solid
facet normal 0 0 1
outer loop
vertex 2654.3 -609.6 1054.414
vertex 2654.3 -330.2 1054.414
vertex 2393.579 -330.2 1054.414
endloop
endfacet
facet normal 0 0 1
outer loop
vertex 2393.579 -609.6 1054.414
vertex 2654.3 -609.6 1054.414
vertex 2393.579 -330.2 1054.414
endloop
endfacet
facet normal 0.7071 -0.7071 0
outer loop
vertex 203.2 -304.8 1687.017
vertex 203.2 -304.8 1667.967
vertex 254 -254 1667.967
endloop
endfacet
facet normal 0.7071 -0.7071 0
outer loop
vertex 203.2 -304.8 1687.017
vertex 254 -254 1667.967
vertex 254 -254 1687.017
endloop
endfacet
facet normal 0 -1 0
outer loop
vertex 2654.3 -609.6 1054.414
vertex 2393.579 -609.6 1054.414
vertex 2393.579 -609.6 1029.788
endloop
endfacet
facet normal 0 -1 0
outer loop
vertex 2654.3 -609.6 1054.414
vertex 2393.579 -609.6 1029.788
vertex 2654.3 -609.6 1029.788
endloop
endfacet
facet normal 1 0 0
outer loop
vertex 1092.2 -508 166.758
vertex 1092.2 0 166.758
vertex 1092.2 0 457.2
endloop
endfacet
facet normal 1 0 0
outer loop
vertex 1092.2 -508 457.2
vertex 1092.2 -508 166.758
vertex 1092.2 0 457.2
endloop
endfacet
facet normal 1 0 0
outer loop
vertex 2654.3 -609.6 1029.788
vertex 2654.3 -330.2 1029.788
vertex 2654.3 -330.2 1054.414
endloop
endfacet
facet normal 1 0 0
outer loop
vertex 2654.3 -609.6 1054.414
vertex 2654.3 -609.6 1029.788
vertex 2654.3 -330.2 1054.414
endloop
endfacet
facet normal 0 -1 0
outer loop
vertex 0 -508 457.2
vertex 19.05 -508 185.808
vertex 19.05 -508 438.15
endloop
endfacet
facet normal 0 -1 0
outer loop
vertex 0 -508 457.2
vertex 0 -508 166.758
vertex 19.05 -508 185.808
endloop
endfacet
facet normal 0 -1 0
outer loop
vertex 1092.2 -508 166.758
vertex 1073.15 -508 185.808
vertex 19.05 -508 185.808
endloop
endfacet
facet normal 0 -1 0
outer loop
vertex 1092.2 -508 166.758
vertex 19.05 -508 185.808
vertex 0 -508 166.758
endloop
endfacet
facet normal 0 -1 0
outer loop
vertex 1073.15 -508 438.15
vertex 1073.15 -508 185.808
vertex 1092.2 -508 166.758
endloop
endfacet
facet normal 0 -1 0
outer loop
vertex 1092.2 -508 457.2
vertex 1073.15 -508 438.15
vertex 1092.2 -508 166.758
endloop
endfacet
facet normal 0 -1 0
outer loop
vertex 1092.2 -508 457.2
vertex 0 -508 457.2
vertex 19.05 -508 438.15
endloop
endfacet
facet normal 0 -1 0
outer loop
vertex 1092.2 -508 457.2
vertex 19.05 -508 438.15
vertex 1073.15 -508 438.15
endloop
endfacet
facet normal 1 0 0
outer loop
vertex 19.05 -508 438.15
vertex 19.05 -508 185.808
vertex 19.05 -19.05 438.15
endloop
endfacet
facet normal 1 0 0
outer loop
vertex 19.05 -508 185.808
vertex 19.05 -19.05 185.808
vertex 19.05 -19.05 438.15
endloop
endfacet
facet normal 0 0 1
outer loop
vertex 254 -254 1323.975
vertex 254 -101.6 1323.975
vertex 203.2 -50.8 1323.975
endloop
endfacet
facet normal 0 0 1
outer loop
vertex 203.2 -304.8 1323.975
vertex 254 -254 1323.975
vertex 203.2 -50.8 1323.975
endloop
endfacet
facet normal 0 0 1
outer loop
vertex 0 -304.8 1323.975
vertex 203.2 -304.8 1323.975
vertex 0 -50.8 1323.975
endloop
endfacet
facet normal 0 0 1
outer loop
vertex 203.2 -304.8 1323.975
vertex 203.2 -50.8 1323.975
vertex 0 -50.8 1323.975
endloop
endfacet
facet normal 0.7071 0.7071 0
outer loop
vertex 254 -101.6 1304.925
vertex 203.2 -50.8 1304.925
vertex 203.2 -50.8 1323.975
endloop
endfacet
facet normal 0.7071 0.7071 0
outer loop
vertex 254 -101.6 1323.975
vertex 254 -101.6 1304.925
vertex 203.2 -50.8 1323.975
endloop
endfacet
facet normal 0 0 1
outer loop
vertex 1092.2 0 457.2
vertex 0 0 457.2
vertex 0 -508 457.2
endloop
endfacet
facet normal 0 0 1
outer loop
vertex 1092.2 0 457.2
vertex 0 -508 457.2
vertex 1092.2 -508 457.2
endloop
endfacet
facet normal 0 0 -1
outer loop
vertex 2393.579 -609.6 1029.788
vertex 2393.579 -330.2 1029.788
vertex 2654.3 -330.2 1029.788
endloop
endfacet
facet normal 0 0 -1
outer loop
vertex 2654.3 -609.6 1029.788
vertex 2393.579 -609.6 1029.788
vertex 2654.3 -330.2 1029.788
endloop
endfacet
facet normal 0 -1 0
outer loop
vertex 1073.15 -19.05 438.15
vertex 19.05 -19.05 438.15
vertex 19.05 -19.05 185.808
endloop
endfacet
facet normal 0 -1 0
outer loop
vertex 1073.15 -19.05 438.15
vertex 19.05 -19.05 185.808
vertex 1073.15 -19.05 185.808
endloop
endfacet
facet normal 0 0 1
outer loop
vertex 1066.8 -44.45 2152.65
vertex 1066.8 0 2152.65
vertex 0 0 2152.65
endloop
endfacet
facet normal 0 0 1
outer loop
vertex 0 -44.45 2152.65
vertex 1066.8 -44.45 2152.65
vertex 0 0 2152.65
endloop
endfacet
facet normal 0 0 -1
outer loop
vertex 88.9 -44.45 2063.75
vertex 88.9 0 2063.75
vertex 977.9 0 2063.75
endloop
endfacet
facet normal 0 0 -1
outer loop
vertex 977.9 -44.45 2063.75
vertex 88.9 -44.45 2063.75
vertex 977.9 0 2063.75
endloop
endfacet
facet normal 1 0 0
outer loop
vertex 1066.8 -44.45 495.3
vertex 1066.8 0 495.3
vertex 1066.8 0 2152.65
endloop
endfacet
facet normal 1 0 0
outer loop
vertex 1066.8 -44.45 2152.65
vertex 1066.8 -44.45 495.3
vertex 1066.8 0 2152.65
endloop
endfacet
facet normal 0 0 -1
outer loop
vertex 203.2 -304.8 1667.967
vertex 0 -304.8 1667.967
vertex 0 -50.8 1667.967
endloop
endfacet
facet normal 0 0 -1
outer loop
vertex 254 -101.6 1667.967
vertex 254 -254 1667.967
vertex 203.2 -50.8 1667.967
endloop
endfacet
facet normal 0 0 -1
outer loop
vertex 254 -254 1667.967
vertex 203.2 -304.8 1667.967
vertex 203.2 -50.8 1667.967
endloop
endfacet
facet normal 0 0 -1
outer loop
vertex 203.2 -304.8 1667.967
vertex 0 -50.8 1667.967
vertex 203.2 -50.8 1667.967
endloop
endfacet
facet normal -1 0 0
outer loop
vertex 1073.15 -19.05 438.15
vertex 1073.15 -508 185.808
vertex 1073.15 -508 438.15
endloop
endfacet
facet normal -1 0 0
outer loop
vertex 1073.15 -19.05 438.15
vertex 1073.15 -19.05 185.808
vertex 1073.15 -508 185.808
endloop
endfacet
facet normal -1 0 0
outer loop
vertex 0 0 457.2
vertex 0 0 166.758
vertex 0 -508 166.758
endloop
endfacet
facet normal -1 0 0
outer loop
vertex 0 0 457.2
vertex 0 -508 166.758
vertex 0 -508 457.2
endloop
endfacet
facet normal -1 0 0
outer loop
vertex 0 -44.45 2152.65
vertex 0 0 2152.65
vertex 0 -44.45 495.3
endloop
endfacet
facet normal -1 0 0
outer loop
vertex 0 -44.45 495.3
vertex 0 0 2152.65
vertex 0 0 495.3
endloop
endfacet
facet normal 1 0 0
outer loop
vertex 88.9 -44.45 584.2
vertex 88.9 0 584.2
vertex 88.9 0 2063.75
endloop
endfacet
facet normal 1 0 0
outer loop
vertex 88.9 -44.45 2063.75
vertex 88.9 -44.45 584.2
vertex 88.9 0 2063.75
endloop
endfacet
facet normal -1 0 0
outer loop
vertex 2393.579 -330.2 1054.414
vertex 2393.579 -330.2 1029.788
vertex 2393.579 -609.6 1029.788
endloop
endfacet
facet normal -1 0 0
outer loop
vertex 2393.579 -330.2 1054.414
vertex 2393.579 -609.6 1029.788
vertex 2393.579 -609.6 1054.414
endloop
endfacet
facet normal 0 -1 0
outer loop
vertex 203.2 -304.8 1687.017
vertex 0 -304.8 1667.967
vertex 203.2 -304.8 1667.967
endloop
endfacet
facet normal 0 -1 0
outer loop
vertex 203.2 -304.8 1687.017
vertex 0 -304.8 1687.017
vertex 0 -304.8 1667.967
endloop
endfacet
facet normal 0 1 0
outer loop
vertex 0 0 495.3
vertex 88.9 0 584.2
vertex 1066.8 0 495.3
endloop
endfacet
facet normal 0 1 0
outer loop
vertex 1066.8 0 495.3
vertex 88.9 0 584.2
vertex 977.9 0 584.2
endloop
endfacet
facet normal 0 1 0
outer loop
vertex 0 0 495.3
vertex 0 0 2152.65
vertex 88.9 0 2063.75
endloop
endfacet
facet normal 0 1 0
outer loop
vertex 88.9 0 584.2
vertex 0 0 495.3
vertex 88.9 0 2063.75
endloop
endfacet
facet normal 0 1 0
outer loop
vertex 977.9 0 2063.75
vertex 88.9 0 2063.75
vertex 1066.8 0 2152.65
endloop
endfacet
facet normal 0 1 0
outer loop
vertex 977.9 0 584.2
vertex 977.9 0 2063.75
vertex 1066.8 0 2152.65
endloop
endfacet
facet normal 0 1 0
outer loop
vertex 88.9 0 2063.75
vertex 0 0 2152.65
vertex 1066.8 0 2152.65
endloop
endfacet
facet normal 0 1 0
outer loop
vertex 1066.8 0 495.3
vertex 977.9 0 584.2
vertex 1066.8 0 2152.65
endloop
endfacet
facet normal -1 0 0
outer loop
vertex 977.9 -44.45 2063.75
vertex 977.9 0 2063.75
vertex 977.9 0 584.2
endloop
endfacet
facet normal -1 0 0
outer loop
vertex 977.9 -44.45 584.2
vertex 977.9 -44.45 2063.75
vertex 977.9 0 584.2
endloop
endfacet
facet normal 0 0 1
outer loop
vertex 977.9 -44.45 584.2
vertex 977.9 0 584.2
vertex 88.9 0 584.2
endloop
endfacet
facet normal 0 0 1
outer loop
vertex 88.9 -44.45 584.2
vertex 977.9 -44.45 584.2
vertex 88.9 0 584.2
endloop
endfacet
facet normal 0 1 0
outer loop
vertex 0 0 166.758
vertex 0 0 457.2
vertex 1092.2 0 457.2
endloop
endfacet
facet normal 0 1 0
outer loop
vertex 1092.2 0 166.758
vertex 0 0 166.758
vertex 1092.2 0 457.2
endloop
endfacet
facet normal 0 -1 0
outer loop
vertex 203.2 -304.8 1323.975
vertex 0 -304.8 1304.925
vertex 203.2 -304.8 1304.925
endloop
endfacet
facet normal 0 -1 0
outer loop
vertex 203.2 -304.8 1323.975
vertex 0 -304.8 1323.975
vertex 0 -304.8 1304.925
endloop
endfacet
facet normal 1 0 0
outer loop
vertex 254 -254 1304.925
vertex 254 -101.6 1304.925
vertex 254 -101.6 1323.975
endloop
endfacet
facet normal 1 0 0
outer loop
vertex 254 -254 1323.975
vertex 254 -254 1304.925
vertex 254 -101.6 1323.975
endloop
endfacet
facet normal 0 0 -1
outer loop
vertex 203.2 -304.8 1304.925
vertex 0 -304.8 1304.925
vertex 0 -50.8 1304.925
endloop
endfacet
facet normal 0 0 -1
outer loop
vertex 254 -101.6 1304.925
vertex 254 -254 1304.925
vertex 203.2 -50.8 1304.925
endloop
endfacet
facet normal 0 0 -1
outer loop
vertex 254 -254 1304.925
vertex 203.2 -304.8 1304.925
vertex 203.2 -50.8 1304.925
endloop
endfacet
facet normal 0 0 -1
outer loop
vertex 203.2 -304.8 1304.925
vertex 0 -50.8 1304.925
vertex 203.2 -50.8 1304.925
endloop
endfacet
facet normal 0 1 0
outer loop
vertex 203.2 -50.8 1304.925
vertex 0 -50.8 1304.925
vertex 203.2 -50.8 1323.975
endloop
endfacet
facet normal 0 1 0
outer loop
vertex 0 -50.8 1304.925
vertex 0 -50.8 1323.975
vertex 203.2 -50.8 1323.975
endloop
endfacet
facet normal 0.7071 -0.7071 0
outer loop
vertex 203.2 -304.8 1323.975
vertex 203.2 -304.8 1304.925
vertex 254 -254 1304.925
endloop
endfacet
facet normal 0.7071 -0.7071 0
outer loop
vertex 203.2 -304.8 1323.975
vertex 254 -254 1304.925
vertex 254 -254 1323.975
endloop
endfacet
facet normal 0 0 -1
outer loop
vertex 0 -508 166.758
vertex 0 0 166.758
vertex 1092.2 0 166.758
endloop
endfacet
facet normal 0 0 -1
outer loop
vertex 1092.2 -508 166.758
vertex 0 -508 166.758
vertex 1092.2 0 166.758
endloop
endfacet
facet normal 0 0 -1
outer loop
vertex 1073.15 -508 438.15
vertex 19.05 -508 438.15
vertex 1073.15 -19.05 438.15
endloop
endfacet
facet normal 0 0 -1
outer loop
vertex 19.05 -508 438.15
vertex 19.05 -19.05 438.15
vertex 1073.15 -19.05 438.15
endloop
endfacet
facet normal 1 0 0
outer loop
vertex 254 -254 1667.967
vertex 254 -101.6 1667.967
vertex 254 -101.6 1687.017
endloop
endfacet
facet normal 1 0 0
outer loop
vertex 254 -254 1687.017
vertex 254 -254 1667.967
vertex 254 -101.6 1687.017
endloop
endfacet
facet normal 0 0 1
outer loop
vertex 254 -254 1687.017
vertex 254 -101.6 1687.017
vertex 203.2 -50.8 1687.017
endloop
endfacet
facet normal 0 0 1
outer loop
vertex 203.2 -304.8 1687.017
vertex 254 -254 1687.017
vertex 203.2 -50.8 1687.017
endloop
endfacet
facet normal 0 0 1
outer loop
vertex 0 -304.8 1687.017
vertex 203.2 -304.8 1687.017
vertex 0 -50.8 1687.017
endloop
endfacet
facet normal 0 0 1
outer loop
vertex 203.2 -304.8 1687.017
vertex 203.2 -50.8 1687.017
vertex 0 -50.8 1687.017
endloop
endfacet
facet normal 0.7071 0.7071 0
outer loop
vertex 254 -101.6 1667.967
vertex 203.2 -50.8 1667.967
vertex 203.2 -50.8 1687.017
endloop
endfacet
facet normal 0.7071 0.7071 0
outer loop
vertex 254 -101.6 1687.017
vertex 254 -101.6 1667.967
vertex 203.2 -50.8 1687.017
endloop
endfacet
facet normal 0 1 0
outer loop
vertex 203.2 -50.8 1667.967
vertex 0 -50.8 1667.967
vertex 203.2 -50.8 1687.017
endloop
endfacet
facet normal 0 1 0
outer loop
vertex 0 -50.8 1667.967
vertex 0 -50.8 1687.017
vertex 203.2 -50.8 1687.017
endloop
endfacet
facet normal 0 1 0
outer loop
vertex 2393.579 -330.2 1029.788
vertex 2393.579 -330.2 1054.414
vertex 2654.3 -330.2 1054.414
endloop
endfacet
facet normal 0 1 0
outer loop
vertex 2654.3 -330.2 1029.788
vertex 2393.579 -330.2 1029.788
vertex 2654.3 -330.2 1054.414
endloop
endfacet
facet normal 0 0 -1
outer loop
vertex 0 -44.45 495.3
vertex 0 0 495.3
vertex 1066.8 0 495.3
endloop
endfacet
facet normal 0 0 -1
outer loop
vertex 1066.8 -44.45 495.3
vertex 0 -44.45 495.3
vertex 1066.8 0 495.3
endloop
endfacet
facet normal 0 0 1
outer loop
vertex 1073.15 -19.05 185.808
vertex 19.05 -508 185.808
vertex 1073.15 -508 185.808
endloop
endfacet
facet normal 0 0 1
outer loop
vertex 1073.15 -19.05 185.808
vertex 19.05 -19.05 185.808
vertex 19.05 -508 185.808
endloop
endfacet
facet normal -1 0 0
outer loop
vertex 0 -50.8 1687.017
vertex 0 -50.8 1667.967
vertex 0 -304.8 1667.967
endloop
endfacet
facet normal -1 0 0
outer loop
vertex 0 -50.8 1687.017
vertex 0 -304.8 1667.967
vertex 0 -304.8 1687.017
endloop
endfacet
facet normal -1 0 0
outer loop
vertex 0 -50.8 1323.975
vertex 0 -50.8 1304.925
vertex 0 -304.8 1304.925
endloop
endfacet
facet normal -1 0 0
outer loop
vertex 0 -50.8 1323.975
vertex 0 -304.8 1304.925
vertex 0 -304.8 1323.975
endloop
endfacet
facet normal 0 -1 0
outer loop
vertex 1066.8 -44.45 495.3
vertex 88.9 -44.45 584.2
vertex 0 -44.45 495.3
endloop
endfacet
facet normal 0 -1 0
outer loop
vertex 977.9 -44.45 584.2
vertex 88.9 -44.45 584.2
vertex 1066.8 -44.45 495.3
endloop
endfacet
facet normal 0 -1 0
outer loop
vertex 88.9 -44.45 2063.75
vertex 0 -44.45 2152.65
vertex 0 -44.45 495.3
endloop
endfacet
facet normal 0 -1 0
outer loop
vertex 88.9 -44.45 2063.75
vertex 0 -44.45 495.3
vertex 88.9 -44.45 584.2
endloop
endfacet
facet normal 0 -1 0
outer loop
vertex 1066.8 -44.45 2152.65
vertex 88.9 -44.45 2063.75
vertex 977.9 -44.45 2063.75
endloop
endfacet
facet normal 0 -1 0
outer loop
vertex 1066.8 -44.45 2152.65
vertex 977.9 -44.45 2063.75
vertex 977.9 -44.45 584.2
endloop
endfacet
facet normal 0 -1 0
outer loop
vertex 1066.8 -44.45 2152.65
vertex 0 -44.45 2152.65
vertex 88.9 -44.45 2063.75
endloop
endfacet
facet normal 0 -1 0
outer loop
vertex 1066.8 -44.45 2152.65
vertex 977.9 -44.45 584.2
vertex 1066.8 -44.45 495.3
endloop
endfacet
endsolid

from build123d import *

# Parameters (mm, degrees)
F0_W      = 1092.2
F0_H      = 290.4416266203
F1_DEPTH  = 508
F6_START  = 330.2
F0_W_2    = 63.5
F0_H_2    = 24.6255362988
F0_W_3    = 197.2212322235
F6_DEPTH  = 279.4
F7_START  = 50.8
F0_W_4    = 88.9
F0_H_3    = 19.05
F0_W_5    = 165.1
F7_DEPTH  = 254
F8_SIZE   = 50.8
F8_2_SIZE = 50.8
F0_H_4    = 343.9922002792
F9_DEPTH  = 44.45
F10_T     = -19.05


# Not quite as in the source:
# - the program builds the solid bodies; features that only make, move or delete a surface that nothing else refers to are left out


with BuildPart() as f1:
    # F0 (on Front) → F1 (new body)
    with BuildSketch(Plane.XZ):
        with Locations((546.1, 311.9791866899)):
            Rectangle(F0_W, F0_H)
    extrude(amount=F1_DEPTH)

    # F10
    f10_openings = [f1.faces().sort_by_distance(p)[0] for p in [
        (546.1, -508, 311.979187),
    ]]
    offset(amount=F10_T, openings=f10_openings)


with BuildPart() as f6:
    # F0 (on Front) → F6 (new body)
    with BuildSketch(Plane.XZ.offset(F6_START)):
        with Locations((2622.55, 1042.1009046316)):
            Rectangle(F0_W_2, F0_H_2)
        with Locations((2492.1893838882, 1042.1009046316)):
            Rectangle(F0_W_3, F0_H_2)
    extrude(amount=F6_DEPTH)


with BuildPart() as f7:
    # F0 (on Front) → F7 (new body)
    with BuildSketch(Plane.XZ.offset(F7_START)):
        with Locations((44.45, 1677.4922002792)):
            Rectangle(F0_W_4, F0_H_3)
        with Locations((171.45, 1677.4922002792)):
            Rectangle(F0_W_5, F0_H_3)
    extrude(amount=F7_DEPTH)

    # F8
    f8_edges = [f7.edges().sort_by_distance(p)[0] for p in [
        (254, -304.8, 1677.4922),
        (254, -50.8, 1677.4922),
    ]]
    chamfer(f8_edges, length=F8_SIZE)


with BuildPart() as f7b:
    # F0 (on Front) → F7, piece 2 (new body)
    with BuildSketch(Plane.XZ.offset(F7_START)):
        with Locations((44.45, 1314.45)):
            Rectangle(F0_W_4, F0_H_3)
        with Locations((171.45, 1314.45)):
            Rectangle(F0_W_5, F0_H_3)
    extrude(amount=F7_DEPTH)

    # F8#2
    f8_2_edges = [f7b.edges().sort_by_distance(p)[0] for p in [
        (254, -304.8, 1314.45),
        (254, -50.8, 1314.45),
    ]]
    chamfer(f8_2_edges, length=F8_2_SIZE)


with BuildPart() as f9:
    # F0 (on Front) → F9 (new body)
    with BuildSketch(Plane.XZ):
        with Locations((44.45, 1314.45)):
            Rectangle(F0_W_4, F0_H_3)
        with Locations((44.45, 1495.9711001396)):
            Rectangle(F0_W_4, F0_H_4)
        with Locations((44.45, 1677.4922002792)):
            Rectangle(F0_W_4, F0_H_3)
        Polygon((0, 1304.925), (0, 495.3), (1066.8, 495.3), (1066.8, 2152.65), (0, 2152.65), (0, 1687.0172002792), (88.9, 1687.0172002792), (88.9, 2063.75), (977.9, 2063.75), (977.9, 584.2), (88.9, 584.2), (88.9, 1304.925), align=None)
    extrude(amount=F9_DEPTH)


solid = Compound([f1.part, f6.part, f7.part, f7b.part, f9.part])
